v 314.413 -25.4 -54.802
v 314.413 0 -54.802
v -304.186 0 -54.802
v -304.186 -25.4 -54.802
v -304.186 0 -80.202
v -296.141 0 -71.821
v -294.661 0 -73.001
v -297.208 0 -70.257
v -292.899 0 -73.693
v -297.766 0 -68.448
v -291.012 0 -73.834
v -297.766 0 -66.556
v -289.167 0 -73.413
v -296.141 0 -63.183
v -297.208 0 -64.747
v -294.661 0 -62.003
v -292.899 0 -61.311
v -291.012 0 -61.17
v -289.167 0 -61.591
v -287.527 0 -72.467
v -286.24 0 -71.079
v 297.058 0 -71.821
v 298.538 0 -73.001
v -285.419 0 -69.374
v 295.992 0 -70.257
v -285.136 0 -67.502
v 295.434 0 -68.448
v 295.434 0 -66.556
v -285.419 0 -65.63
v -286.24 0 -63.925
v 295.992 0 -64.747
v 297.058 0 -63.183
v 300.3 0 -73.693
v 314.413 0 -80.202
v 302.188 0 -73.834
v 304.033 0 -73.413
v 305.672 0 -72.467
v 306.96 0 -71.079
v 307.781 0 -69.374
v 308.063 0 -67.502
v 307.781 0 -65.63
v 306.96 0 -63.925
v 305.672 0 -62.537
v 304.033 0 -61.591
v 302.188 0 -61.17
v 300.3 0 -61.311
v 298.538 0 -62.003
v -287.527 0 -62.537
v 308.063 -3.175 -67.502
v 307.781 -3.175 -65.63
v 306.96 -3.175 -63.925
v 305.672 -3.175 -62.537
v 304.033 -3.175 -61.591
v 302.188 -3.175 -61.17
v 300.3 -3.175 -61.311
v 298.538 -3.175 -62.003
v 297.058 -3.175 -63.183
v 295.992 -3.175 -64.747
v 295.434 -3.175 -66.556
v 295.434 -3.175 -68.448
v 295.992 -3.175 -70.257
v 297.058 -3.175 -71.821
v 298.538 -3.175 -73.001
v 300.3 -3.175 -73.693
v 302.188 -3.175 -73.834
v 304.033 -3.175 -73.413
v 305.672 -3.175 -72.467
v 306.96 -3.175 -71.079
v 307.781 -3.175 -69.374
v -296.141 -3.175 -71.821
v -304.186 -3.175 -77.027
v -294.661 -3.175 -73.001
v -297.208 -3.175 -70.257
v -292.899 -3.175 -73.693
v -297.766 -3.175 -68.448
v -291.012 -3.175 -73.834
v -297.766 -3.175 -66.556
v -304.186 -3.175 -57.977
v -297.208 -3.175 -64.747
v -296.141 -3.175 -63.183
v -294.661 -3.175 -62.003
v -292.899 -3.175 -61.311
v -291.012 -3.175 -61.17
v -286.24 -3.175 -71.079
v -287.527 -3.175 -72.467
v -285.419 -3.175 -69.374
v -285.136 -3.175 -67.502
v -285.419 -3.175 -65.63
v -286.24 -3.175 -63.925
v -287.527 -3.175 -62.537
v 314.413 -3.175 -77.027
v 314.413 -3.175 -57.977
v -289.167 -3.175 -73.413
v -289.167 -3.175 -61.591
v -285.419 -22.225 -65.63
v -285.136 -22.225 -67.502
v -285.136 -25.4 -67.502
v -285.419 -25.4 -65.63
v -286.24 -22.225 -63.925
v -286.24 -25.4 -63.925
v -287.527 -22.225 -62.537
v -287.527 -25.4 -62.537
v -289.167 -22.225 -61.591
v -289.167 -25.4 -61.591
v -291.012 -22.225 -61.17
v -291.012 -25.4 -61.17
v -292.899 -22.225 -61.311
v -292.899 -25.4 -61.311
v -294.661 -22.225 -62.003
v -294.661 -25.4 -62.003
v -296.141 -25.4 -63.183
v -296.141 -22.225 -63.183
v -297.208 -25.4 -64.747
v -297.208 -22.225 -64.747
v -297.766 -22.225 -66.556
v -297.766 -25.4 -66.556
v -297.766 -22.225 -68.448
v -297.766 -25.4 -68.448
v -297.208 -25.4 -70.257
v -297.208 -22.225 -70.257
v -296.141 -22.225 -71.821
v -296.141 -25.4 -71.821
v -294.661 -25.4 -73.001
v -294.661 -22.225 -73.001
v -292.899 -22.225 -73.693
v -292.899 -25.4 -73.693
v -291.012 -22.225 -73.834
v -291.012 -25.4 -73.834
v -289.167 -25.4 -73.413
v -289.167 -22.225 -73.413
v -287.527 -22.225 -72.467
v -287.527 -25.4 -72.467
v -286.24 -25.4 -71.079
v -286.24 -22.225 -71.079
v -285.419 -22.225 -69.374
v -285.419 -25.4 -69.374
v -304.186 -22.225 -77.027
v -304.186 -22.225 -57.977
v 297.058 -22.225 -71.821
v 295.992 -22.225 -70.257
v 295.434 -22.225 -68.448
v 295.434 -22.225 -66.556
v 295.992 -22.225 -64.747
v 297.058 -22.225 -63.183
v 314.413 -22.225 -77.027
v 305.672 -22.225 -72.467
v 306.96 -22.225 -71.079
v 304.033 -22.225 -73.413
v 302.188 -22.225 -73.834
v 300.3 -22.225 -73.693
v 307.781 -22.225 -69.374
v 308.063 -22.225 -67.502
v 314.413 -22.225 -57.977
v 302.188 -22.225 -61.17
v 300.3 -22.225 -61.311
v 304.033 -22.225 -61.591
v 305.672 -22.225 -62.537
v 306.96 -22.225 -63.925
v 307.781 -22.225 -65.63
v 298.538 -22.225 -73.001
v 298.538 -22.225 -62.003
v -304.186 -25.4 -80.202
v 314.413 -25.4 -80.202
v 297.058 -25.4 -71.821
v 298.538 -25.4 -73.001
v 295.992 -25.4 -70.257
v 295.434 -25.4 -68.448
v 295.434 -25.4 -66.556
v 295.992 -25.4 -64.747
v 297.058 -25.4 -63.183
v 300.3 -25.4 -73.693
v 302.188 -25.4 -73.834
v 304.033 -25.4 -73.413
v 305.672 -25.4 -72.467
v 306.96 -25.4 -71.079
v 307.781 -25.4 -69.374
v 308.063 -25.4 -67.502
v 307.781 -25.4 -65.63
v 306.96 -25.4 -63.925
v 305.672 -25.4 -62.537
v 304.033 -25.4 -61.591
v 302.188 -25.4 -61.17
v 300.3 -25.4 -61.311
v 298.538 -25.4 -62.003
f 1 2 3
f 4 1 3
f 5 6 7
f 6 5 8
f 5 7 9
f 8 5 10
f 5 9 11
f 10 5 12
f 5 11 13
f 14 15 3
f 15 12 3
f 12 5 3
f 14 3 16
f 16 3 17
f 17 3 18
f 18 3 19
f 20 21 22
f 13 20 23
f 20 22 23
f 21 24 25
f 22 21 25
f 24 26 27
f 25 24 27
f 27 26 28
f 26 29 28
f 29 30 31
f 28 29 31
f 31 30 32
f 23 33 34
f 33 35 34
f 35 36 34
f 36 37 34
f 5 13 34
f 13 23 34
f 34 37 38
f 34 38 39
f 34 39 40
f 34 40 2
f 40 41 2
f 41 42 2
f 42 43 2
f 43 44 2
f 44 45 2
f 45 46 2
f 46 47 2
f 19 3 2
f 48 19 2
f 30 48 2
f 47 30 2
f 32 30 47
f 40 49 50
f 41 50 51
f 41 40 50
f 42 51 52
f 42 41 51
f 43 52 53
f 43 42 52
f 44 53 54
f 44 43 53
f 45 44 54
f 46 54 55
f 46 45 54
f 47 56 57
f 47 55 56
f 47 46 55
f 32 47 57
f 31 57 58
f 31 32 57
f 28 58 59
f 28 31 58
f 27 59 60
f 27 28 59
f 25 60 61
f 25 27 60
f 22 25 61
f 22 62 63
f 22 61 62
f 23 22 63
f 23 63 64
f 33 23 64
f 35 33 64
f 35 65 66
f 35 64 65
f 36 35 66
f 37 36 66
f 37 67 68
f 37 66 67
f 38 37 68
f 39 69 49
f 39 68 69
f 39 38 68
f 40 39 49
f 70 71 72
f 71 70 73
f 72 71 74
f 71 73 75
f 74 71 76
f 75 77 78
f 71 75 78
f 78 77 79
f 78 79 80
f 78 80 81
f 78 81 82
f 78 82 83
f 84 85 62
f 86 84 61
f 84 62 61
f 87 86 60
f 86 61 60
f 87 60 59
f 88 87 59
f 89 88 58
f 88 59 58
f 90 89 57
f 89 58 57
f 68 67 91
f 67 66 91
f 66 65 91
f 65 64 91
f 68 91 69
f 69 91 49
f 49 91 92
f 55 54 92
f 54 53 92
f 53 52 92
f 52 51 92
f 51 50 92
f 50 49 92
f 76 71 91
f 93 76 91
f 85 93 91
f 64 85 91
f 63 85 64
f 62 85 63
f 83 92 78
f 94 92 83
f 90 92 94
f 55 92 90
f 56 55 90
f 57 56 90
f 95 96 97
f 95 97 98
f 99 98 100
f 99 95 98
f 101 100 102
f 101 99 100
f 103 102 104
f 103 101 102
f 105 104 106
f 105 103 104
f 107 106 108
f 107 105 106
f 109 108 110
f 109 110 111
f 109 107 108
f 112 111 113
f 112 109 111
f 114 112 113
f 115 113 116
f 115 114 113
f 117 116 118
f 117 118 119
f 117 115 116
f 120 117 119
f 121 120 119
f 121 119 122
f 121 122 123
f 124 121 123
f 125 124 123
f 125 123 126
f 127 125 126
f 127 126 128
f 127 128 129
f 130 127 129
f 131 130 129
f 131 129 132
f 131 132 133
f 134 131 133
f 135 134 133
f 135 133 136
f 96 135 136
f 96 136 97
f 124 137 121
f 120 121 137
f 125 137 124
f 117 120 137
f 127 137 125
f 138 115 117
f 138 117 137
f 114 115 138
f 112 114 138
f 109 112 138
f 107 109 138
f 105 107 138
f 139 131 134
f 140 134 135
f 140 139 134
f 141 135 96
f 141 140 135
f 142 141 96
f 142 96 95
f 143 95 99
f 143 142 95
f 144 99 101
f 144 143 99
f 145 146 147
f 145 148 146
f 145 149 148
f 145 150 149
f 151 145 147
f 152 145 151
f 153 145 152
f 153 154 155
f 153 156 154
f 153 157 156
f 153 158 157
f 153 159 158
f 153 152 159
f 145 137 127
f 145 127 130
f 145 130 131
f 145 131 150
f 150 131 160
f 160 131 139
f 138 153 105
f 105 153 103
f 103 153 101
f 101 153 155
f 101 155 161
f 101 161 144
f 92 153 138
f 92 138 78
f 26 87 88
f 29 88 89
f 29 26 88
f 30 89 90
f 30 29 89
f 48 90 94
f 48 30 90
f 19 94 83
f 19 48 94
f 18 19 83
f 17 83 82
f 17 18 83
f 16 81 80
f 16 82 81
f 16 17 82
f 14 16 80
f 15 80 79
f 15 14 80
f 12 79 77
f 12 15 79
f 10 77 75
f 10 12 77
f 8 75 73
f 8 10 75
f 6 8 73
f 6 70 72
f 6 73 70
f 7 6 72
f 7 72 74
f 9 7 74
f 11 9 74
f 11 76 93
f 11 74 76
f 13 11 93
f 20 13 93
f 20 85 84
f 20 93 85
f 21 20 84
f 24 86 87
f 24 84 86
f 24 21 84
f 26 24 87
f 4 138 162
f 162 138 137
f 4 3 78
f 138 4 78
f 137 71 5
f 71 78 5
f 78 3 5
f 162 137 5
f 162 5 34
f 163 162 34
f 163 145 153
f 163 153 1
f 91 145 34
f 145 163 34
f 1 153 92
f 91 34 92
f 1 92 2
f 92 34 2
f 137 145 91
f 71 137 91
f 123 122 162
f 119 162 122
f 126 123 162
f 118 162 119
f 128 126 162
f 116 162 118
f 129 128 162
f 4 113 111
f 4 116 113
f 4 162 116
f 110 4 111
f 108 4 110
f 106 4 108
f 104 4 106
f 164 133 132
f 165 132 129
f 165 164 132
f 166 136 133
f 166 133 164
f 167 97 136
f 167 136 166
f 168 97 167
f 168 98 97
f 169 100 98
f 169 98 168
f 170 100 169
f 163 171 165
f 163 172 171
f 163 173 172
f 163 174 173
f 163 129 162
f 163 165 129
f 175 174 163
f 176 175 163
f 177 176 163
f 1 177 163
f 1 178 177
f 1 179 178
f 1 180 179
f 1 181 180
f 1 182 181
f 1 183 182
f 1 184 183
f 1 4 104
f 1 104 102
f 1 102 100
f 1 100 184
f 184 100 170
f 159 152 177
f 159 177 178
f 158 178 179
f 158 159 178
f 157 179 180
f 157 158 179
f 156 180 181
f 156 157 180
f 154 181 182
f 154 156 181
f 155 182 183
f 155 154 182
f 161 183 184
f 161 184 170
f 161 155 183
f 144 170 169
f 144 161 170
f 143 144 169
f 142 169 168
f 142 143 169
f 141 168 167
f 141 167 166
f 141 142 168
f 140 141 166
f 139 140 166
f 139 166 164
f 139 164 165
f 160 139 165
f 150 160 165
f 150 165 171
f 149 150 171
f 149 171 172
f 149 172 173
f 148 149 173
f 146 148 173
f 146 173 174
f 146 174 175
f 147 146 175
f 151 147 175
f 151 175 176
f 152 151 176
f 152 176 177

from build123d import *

# Parameters (mm, degrees)
F0_R     = 6.35
F1_DEPTH = 15.875
F2_DEPTH = 25.4
F3_W     = 19.05
F3_H     = 19.05
F4_DEPTH = 618.600804


with BuildPart() as f1:
    # F0 (on Front) → F1 (new body)
    with BuildSketch(Plane.XZ):
        Polygon((301.713325, -54.802002), (-291.486479, -54.802002), (-304.186479, -54.802002), (-304.186479, -80.202002), (-291.486479, -80.202002), (301.713325, -80.202002), (314.413325, -80.202002), (314.413325, -54.802002), align=None)
        with Locations((-291.486479, -67.502002)):
            Circle(F0_R, mode=Mode.SUBTRACT)
        with Locations((301.713325, -67.502002)):
            Circle(F0_R, mode=Mode.SUBTRACT)
    extrude(amount=F1_DEPTH)

    # F0 (on Front) → F2 (join)
    with BuildSketch(Plane.XZ):
        Polygon((301.713325, -54.802002), (-291.486479, -54.802002), (-304.186479, -54.802002), (-304.186479, -80.202002), (-291.486479, -80.202002), (301.713325, -80.202002), (314.413325, -80.202002), (314.413325, -54.802002), align=None)
        with Locations((-291.486479, -67.502002)):
            Circle(F0_R, mode=Mode.SUBTRACT)
        with Locations((301.713325, -67.502002)):
            Circle(F0_R, mode=Mode.SUBTRACT)
    extrude(amount=F2_DEPTH)

    # F3 (on face) → F4 (cut, through all)
    with BuildSketch(Plane.YZ.offset(314.413325)):
        with Locations((-12.7, -67.502002)):
            Rectangle(F3_W, F3_H)
    extrude(amount=-F4_DEPTH, mode=Mode.SUBTRACT)


solid = f1.part
